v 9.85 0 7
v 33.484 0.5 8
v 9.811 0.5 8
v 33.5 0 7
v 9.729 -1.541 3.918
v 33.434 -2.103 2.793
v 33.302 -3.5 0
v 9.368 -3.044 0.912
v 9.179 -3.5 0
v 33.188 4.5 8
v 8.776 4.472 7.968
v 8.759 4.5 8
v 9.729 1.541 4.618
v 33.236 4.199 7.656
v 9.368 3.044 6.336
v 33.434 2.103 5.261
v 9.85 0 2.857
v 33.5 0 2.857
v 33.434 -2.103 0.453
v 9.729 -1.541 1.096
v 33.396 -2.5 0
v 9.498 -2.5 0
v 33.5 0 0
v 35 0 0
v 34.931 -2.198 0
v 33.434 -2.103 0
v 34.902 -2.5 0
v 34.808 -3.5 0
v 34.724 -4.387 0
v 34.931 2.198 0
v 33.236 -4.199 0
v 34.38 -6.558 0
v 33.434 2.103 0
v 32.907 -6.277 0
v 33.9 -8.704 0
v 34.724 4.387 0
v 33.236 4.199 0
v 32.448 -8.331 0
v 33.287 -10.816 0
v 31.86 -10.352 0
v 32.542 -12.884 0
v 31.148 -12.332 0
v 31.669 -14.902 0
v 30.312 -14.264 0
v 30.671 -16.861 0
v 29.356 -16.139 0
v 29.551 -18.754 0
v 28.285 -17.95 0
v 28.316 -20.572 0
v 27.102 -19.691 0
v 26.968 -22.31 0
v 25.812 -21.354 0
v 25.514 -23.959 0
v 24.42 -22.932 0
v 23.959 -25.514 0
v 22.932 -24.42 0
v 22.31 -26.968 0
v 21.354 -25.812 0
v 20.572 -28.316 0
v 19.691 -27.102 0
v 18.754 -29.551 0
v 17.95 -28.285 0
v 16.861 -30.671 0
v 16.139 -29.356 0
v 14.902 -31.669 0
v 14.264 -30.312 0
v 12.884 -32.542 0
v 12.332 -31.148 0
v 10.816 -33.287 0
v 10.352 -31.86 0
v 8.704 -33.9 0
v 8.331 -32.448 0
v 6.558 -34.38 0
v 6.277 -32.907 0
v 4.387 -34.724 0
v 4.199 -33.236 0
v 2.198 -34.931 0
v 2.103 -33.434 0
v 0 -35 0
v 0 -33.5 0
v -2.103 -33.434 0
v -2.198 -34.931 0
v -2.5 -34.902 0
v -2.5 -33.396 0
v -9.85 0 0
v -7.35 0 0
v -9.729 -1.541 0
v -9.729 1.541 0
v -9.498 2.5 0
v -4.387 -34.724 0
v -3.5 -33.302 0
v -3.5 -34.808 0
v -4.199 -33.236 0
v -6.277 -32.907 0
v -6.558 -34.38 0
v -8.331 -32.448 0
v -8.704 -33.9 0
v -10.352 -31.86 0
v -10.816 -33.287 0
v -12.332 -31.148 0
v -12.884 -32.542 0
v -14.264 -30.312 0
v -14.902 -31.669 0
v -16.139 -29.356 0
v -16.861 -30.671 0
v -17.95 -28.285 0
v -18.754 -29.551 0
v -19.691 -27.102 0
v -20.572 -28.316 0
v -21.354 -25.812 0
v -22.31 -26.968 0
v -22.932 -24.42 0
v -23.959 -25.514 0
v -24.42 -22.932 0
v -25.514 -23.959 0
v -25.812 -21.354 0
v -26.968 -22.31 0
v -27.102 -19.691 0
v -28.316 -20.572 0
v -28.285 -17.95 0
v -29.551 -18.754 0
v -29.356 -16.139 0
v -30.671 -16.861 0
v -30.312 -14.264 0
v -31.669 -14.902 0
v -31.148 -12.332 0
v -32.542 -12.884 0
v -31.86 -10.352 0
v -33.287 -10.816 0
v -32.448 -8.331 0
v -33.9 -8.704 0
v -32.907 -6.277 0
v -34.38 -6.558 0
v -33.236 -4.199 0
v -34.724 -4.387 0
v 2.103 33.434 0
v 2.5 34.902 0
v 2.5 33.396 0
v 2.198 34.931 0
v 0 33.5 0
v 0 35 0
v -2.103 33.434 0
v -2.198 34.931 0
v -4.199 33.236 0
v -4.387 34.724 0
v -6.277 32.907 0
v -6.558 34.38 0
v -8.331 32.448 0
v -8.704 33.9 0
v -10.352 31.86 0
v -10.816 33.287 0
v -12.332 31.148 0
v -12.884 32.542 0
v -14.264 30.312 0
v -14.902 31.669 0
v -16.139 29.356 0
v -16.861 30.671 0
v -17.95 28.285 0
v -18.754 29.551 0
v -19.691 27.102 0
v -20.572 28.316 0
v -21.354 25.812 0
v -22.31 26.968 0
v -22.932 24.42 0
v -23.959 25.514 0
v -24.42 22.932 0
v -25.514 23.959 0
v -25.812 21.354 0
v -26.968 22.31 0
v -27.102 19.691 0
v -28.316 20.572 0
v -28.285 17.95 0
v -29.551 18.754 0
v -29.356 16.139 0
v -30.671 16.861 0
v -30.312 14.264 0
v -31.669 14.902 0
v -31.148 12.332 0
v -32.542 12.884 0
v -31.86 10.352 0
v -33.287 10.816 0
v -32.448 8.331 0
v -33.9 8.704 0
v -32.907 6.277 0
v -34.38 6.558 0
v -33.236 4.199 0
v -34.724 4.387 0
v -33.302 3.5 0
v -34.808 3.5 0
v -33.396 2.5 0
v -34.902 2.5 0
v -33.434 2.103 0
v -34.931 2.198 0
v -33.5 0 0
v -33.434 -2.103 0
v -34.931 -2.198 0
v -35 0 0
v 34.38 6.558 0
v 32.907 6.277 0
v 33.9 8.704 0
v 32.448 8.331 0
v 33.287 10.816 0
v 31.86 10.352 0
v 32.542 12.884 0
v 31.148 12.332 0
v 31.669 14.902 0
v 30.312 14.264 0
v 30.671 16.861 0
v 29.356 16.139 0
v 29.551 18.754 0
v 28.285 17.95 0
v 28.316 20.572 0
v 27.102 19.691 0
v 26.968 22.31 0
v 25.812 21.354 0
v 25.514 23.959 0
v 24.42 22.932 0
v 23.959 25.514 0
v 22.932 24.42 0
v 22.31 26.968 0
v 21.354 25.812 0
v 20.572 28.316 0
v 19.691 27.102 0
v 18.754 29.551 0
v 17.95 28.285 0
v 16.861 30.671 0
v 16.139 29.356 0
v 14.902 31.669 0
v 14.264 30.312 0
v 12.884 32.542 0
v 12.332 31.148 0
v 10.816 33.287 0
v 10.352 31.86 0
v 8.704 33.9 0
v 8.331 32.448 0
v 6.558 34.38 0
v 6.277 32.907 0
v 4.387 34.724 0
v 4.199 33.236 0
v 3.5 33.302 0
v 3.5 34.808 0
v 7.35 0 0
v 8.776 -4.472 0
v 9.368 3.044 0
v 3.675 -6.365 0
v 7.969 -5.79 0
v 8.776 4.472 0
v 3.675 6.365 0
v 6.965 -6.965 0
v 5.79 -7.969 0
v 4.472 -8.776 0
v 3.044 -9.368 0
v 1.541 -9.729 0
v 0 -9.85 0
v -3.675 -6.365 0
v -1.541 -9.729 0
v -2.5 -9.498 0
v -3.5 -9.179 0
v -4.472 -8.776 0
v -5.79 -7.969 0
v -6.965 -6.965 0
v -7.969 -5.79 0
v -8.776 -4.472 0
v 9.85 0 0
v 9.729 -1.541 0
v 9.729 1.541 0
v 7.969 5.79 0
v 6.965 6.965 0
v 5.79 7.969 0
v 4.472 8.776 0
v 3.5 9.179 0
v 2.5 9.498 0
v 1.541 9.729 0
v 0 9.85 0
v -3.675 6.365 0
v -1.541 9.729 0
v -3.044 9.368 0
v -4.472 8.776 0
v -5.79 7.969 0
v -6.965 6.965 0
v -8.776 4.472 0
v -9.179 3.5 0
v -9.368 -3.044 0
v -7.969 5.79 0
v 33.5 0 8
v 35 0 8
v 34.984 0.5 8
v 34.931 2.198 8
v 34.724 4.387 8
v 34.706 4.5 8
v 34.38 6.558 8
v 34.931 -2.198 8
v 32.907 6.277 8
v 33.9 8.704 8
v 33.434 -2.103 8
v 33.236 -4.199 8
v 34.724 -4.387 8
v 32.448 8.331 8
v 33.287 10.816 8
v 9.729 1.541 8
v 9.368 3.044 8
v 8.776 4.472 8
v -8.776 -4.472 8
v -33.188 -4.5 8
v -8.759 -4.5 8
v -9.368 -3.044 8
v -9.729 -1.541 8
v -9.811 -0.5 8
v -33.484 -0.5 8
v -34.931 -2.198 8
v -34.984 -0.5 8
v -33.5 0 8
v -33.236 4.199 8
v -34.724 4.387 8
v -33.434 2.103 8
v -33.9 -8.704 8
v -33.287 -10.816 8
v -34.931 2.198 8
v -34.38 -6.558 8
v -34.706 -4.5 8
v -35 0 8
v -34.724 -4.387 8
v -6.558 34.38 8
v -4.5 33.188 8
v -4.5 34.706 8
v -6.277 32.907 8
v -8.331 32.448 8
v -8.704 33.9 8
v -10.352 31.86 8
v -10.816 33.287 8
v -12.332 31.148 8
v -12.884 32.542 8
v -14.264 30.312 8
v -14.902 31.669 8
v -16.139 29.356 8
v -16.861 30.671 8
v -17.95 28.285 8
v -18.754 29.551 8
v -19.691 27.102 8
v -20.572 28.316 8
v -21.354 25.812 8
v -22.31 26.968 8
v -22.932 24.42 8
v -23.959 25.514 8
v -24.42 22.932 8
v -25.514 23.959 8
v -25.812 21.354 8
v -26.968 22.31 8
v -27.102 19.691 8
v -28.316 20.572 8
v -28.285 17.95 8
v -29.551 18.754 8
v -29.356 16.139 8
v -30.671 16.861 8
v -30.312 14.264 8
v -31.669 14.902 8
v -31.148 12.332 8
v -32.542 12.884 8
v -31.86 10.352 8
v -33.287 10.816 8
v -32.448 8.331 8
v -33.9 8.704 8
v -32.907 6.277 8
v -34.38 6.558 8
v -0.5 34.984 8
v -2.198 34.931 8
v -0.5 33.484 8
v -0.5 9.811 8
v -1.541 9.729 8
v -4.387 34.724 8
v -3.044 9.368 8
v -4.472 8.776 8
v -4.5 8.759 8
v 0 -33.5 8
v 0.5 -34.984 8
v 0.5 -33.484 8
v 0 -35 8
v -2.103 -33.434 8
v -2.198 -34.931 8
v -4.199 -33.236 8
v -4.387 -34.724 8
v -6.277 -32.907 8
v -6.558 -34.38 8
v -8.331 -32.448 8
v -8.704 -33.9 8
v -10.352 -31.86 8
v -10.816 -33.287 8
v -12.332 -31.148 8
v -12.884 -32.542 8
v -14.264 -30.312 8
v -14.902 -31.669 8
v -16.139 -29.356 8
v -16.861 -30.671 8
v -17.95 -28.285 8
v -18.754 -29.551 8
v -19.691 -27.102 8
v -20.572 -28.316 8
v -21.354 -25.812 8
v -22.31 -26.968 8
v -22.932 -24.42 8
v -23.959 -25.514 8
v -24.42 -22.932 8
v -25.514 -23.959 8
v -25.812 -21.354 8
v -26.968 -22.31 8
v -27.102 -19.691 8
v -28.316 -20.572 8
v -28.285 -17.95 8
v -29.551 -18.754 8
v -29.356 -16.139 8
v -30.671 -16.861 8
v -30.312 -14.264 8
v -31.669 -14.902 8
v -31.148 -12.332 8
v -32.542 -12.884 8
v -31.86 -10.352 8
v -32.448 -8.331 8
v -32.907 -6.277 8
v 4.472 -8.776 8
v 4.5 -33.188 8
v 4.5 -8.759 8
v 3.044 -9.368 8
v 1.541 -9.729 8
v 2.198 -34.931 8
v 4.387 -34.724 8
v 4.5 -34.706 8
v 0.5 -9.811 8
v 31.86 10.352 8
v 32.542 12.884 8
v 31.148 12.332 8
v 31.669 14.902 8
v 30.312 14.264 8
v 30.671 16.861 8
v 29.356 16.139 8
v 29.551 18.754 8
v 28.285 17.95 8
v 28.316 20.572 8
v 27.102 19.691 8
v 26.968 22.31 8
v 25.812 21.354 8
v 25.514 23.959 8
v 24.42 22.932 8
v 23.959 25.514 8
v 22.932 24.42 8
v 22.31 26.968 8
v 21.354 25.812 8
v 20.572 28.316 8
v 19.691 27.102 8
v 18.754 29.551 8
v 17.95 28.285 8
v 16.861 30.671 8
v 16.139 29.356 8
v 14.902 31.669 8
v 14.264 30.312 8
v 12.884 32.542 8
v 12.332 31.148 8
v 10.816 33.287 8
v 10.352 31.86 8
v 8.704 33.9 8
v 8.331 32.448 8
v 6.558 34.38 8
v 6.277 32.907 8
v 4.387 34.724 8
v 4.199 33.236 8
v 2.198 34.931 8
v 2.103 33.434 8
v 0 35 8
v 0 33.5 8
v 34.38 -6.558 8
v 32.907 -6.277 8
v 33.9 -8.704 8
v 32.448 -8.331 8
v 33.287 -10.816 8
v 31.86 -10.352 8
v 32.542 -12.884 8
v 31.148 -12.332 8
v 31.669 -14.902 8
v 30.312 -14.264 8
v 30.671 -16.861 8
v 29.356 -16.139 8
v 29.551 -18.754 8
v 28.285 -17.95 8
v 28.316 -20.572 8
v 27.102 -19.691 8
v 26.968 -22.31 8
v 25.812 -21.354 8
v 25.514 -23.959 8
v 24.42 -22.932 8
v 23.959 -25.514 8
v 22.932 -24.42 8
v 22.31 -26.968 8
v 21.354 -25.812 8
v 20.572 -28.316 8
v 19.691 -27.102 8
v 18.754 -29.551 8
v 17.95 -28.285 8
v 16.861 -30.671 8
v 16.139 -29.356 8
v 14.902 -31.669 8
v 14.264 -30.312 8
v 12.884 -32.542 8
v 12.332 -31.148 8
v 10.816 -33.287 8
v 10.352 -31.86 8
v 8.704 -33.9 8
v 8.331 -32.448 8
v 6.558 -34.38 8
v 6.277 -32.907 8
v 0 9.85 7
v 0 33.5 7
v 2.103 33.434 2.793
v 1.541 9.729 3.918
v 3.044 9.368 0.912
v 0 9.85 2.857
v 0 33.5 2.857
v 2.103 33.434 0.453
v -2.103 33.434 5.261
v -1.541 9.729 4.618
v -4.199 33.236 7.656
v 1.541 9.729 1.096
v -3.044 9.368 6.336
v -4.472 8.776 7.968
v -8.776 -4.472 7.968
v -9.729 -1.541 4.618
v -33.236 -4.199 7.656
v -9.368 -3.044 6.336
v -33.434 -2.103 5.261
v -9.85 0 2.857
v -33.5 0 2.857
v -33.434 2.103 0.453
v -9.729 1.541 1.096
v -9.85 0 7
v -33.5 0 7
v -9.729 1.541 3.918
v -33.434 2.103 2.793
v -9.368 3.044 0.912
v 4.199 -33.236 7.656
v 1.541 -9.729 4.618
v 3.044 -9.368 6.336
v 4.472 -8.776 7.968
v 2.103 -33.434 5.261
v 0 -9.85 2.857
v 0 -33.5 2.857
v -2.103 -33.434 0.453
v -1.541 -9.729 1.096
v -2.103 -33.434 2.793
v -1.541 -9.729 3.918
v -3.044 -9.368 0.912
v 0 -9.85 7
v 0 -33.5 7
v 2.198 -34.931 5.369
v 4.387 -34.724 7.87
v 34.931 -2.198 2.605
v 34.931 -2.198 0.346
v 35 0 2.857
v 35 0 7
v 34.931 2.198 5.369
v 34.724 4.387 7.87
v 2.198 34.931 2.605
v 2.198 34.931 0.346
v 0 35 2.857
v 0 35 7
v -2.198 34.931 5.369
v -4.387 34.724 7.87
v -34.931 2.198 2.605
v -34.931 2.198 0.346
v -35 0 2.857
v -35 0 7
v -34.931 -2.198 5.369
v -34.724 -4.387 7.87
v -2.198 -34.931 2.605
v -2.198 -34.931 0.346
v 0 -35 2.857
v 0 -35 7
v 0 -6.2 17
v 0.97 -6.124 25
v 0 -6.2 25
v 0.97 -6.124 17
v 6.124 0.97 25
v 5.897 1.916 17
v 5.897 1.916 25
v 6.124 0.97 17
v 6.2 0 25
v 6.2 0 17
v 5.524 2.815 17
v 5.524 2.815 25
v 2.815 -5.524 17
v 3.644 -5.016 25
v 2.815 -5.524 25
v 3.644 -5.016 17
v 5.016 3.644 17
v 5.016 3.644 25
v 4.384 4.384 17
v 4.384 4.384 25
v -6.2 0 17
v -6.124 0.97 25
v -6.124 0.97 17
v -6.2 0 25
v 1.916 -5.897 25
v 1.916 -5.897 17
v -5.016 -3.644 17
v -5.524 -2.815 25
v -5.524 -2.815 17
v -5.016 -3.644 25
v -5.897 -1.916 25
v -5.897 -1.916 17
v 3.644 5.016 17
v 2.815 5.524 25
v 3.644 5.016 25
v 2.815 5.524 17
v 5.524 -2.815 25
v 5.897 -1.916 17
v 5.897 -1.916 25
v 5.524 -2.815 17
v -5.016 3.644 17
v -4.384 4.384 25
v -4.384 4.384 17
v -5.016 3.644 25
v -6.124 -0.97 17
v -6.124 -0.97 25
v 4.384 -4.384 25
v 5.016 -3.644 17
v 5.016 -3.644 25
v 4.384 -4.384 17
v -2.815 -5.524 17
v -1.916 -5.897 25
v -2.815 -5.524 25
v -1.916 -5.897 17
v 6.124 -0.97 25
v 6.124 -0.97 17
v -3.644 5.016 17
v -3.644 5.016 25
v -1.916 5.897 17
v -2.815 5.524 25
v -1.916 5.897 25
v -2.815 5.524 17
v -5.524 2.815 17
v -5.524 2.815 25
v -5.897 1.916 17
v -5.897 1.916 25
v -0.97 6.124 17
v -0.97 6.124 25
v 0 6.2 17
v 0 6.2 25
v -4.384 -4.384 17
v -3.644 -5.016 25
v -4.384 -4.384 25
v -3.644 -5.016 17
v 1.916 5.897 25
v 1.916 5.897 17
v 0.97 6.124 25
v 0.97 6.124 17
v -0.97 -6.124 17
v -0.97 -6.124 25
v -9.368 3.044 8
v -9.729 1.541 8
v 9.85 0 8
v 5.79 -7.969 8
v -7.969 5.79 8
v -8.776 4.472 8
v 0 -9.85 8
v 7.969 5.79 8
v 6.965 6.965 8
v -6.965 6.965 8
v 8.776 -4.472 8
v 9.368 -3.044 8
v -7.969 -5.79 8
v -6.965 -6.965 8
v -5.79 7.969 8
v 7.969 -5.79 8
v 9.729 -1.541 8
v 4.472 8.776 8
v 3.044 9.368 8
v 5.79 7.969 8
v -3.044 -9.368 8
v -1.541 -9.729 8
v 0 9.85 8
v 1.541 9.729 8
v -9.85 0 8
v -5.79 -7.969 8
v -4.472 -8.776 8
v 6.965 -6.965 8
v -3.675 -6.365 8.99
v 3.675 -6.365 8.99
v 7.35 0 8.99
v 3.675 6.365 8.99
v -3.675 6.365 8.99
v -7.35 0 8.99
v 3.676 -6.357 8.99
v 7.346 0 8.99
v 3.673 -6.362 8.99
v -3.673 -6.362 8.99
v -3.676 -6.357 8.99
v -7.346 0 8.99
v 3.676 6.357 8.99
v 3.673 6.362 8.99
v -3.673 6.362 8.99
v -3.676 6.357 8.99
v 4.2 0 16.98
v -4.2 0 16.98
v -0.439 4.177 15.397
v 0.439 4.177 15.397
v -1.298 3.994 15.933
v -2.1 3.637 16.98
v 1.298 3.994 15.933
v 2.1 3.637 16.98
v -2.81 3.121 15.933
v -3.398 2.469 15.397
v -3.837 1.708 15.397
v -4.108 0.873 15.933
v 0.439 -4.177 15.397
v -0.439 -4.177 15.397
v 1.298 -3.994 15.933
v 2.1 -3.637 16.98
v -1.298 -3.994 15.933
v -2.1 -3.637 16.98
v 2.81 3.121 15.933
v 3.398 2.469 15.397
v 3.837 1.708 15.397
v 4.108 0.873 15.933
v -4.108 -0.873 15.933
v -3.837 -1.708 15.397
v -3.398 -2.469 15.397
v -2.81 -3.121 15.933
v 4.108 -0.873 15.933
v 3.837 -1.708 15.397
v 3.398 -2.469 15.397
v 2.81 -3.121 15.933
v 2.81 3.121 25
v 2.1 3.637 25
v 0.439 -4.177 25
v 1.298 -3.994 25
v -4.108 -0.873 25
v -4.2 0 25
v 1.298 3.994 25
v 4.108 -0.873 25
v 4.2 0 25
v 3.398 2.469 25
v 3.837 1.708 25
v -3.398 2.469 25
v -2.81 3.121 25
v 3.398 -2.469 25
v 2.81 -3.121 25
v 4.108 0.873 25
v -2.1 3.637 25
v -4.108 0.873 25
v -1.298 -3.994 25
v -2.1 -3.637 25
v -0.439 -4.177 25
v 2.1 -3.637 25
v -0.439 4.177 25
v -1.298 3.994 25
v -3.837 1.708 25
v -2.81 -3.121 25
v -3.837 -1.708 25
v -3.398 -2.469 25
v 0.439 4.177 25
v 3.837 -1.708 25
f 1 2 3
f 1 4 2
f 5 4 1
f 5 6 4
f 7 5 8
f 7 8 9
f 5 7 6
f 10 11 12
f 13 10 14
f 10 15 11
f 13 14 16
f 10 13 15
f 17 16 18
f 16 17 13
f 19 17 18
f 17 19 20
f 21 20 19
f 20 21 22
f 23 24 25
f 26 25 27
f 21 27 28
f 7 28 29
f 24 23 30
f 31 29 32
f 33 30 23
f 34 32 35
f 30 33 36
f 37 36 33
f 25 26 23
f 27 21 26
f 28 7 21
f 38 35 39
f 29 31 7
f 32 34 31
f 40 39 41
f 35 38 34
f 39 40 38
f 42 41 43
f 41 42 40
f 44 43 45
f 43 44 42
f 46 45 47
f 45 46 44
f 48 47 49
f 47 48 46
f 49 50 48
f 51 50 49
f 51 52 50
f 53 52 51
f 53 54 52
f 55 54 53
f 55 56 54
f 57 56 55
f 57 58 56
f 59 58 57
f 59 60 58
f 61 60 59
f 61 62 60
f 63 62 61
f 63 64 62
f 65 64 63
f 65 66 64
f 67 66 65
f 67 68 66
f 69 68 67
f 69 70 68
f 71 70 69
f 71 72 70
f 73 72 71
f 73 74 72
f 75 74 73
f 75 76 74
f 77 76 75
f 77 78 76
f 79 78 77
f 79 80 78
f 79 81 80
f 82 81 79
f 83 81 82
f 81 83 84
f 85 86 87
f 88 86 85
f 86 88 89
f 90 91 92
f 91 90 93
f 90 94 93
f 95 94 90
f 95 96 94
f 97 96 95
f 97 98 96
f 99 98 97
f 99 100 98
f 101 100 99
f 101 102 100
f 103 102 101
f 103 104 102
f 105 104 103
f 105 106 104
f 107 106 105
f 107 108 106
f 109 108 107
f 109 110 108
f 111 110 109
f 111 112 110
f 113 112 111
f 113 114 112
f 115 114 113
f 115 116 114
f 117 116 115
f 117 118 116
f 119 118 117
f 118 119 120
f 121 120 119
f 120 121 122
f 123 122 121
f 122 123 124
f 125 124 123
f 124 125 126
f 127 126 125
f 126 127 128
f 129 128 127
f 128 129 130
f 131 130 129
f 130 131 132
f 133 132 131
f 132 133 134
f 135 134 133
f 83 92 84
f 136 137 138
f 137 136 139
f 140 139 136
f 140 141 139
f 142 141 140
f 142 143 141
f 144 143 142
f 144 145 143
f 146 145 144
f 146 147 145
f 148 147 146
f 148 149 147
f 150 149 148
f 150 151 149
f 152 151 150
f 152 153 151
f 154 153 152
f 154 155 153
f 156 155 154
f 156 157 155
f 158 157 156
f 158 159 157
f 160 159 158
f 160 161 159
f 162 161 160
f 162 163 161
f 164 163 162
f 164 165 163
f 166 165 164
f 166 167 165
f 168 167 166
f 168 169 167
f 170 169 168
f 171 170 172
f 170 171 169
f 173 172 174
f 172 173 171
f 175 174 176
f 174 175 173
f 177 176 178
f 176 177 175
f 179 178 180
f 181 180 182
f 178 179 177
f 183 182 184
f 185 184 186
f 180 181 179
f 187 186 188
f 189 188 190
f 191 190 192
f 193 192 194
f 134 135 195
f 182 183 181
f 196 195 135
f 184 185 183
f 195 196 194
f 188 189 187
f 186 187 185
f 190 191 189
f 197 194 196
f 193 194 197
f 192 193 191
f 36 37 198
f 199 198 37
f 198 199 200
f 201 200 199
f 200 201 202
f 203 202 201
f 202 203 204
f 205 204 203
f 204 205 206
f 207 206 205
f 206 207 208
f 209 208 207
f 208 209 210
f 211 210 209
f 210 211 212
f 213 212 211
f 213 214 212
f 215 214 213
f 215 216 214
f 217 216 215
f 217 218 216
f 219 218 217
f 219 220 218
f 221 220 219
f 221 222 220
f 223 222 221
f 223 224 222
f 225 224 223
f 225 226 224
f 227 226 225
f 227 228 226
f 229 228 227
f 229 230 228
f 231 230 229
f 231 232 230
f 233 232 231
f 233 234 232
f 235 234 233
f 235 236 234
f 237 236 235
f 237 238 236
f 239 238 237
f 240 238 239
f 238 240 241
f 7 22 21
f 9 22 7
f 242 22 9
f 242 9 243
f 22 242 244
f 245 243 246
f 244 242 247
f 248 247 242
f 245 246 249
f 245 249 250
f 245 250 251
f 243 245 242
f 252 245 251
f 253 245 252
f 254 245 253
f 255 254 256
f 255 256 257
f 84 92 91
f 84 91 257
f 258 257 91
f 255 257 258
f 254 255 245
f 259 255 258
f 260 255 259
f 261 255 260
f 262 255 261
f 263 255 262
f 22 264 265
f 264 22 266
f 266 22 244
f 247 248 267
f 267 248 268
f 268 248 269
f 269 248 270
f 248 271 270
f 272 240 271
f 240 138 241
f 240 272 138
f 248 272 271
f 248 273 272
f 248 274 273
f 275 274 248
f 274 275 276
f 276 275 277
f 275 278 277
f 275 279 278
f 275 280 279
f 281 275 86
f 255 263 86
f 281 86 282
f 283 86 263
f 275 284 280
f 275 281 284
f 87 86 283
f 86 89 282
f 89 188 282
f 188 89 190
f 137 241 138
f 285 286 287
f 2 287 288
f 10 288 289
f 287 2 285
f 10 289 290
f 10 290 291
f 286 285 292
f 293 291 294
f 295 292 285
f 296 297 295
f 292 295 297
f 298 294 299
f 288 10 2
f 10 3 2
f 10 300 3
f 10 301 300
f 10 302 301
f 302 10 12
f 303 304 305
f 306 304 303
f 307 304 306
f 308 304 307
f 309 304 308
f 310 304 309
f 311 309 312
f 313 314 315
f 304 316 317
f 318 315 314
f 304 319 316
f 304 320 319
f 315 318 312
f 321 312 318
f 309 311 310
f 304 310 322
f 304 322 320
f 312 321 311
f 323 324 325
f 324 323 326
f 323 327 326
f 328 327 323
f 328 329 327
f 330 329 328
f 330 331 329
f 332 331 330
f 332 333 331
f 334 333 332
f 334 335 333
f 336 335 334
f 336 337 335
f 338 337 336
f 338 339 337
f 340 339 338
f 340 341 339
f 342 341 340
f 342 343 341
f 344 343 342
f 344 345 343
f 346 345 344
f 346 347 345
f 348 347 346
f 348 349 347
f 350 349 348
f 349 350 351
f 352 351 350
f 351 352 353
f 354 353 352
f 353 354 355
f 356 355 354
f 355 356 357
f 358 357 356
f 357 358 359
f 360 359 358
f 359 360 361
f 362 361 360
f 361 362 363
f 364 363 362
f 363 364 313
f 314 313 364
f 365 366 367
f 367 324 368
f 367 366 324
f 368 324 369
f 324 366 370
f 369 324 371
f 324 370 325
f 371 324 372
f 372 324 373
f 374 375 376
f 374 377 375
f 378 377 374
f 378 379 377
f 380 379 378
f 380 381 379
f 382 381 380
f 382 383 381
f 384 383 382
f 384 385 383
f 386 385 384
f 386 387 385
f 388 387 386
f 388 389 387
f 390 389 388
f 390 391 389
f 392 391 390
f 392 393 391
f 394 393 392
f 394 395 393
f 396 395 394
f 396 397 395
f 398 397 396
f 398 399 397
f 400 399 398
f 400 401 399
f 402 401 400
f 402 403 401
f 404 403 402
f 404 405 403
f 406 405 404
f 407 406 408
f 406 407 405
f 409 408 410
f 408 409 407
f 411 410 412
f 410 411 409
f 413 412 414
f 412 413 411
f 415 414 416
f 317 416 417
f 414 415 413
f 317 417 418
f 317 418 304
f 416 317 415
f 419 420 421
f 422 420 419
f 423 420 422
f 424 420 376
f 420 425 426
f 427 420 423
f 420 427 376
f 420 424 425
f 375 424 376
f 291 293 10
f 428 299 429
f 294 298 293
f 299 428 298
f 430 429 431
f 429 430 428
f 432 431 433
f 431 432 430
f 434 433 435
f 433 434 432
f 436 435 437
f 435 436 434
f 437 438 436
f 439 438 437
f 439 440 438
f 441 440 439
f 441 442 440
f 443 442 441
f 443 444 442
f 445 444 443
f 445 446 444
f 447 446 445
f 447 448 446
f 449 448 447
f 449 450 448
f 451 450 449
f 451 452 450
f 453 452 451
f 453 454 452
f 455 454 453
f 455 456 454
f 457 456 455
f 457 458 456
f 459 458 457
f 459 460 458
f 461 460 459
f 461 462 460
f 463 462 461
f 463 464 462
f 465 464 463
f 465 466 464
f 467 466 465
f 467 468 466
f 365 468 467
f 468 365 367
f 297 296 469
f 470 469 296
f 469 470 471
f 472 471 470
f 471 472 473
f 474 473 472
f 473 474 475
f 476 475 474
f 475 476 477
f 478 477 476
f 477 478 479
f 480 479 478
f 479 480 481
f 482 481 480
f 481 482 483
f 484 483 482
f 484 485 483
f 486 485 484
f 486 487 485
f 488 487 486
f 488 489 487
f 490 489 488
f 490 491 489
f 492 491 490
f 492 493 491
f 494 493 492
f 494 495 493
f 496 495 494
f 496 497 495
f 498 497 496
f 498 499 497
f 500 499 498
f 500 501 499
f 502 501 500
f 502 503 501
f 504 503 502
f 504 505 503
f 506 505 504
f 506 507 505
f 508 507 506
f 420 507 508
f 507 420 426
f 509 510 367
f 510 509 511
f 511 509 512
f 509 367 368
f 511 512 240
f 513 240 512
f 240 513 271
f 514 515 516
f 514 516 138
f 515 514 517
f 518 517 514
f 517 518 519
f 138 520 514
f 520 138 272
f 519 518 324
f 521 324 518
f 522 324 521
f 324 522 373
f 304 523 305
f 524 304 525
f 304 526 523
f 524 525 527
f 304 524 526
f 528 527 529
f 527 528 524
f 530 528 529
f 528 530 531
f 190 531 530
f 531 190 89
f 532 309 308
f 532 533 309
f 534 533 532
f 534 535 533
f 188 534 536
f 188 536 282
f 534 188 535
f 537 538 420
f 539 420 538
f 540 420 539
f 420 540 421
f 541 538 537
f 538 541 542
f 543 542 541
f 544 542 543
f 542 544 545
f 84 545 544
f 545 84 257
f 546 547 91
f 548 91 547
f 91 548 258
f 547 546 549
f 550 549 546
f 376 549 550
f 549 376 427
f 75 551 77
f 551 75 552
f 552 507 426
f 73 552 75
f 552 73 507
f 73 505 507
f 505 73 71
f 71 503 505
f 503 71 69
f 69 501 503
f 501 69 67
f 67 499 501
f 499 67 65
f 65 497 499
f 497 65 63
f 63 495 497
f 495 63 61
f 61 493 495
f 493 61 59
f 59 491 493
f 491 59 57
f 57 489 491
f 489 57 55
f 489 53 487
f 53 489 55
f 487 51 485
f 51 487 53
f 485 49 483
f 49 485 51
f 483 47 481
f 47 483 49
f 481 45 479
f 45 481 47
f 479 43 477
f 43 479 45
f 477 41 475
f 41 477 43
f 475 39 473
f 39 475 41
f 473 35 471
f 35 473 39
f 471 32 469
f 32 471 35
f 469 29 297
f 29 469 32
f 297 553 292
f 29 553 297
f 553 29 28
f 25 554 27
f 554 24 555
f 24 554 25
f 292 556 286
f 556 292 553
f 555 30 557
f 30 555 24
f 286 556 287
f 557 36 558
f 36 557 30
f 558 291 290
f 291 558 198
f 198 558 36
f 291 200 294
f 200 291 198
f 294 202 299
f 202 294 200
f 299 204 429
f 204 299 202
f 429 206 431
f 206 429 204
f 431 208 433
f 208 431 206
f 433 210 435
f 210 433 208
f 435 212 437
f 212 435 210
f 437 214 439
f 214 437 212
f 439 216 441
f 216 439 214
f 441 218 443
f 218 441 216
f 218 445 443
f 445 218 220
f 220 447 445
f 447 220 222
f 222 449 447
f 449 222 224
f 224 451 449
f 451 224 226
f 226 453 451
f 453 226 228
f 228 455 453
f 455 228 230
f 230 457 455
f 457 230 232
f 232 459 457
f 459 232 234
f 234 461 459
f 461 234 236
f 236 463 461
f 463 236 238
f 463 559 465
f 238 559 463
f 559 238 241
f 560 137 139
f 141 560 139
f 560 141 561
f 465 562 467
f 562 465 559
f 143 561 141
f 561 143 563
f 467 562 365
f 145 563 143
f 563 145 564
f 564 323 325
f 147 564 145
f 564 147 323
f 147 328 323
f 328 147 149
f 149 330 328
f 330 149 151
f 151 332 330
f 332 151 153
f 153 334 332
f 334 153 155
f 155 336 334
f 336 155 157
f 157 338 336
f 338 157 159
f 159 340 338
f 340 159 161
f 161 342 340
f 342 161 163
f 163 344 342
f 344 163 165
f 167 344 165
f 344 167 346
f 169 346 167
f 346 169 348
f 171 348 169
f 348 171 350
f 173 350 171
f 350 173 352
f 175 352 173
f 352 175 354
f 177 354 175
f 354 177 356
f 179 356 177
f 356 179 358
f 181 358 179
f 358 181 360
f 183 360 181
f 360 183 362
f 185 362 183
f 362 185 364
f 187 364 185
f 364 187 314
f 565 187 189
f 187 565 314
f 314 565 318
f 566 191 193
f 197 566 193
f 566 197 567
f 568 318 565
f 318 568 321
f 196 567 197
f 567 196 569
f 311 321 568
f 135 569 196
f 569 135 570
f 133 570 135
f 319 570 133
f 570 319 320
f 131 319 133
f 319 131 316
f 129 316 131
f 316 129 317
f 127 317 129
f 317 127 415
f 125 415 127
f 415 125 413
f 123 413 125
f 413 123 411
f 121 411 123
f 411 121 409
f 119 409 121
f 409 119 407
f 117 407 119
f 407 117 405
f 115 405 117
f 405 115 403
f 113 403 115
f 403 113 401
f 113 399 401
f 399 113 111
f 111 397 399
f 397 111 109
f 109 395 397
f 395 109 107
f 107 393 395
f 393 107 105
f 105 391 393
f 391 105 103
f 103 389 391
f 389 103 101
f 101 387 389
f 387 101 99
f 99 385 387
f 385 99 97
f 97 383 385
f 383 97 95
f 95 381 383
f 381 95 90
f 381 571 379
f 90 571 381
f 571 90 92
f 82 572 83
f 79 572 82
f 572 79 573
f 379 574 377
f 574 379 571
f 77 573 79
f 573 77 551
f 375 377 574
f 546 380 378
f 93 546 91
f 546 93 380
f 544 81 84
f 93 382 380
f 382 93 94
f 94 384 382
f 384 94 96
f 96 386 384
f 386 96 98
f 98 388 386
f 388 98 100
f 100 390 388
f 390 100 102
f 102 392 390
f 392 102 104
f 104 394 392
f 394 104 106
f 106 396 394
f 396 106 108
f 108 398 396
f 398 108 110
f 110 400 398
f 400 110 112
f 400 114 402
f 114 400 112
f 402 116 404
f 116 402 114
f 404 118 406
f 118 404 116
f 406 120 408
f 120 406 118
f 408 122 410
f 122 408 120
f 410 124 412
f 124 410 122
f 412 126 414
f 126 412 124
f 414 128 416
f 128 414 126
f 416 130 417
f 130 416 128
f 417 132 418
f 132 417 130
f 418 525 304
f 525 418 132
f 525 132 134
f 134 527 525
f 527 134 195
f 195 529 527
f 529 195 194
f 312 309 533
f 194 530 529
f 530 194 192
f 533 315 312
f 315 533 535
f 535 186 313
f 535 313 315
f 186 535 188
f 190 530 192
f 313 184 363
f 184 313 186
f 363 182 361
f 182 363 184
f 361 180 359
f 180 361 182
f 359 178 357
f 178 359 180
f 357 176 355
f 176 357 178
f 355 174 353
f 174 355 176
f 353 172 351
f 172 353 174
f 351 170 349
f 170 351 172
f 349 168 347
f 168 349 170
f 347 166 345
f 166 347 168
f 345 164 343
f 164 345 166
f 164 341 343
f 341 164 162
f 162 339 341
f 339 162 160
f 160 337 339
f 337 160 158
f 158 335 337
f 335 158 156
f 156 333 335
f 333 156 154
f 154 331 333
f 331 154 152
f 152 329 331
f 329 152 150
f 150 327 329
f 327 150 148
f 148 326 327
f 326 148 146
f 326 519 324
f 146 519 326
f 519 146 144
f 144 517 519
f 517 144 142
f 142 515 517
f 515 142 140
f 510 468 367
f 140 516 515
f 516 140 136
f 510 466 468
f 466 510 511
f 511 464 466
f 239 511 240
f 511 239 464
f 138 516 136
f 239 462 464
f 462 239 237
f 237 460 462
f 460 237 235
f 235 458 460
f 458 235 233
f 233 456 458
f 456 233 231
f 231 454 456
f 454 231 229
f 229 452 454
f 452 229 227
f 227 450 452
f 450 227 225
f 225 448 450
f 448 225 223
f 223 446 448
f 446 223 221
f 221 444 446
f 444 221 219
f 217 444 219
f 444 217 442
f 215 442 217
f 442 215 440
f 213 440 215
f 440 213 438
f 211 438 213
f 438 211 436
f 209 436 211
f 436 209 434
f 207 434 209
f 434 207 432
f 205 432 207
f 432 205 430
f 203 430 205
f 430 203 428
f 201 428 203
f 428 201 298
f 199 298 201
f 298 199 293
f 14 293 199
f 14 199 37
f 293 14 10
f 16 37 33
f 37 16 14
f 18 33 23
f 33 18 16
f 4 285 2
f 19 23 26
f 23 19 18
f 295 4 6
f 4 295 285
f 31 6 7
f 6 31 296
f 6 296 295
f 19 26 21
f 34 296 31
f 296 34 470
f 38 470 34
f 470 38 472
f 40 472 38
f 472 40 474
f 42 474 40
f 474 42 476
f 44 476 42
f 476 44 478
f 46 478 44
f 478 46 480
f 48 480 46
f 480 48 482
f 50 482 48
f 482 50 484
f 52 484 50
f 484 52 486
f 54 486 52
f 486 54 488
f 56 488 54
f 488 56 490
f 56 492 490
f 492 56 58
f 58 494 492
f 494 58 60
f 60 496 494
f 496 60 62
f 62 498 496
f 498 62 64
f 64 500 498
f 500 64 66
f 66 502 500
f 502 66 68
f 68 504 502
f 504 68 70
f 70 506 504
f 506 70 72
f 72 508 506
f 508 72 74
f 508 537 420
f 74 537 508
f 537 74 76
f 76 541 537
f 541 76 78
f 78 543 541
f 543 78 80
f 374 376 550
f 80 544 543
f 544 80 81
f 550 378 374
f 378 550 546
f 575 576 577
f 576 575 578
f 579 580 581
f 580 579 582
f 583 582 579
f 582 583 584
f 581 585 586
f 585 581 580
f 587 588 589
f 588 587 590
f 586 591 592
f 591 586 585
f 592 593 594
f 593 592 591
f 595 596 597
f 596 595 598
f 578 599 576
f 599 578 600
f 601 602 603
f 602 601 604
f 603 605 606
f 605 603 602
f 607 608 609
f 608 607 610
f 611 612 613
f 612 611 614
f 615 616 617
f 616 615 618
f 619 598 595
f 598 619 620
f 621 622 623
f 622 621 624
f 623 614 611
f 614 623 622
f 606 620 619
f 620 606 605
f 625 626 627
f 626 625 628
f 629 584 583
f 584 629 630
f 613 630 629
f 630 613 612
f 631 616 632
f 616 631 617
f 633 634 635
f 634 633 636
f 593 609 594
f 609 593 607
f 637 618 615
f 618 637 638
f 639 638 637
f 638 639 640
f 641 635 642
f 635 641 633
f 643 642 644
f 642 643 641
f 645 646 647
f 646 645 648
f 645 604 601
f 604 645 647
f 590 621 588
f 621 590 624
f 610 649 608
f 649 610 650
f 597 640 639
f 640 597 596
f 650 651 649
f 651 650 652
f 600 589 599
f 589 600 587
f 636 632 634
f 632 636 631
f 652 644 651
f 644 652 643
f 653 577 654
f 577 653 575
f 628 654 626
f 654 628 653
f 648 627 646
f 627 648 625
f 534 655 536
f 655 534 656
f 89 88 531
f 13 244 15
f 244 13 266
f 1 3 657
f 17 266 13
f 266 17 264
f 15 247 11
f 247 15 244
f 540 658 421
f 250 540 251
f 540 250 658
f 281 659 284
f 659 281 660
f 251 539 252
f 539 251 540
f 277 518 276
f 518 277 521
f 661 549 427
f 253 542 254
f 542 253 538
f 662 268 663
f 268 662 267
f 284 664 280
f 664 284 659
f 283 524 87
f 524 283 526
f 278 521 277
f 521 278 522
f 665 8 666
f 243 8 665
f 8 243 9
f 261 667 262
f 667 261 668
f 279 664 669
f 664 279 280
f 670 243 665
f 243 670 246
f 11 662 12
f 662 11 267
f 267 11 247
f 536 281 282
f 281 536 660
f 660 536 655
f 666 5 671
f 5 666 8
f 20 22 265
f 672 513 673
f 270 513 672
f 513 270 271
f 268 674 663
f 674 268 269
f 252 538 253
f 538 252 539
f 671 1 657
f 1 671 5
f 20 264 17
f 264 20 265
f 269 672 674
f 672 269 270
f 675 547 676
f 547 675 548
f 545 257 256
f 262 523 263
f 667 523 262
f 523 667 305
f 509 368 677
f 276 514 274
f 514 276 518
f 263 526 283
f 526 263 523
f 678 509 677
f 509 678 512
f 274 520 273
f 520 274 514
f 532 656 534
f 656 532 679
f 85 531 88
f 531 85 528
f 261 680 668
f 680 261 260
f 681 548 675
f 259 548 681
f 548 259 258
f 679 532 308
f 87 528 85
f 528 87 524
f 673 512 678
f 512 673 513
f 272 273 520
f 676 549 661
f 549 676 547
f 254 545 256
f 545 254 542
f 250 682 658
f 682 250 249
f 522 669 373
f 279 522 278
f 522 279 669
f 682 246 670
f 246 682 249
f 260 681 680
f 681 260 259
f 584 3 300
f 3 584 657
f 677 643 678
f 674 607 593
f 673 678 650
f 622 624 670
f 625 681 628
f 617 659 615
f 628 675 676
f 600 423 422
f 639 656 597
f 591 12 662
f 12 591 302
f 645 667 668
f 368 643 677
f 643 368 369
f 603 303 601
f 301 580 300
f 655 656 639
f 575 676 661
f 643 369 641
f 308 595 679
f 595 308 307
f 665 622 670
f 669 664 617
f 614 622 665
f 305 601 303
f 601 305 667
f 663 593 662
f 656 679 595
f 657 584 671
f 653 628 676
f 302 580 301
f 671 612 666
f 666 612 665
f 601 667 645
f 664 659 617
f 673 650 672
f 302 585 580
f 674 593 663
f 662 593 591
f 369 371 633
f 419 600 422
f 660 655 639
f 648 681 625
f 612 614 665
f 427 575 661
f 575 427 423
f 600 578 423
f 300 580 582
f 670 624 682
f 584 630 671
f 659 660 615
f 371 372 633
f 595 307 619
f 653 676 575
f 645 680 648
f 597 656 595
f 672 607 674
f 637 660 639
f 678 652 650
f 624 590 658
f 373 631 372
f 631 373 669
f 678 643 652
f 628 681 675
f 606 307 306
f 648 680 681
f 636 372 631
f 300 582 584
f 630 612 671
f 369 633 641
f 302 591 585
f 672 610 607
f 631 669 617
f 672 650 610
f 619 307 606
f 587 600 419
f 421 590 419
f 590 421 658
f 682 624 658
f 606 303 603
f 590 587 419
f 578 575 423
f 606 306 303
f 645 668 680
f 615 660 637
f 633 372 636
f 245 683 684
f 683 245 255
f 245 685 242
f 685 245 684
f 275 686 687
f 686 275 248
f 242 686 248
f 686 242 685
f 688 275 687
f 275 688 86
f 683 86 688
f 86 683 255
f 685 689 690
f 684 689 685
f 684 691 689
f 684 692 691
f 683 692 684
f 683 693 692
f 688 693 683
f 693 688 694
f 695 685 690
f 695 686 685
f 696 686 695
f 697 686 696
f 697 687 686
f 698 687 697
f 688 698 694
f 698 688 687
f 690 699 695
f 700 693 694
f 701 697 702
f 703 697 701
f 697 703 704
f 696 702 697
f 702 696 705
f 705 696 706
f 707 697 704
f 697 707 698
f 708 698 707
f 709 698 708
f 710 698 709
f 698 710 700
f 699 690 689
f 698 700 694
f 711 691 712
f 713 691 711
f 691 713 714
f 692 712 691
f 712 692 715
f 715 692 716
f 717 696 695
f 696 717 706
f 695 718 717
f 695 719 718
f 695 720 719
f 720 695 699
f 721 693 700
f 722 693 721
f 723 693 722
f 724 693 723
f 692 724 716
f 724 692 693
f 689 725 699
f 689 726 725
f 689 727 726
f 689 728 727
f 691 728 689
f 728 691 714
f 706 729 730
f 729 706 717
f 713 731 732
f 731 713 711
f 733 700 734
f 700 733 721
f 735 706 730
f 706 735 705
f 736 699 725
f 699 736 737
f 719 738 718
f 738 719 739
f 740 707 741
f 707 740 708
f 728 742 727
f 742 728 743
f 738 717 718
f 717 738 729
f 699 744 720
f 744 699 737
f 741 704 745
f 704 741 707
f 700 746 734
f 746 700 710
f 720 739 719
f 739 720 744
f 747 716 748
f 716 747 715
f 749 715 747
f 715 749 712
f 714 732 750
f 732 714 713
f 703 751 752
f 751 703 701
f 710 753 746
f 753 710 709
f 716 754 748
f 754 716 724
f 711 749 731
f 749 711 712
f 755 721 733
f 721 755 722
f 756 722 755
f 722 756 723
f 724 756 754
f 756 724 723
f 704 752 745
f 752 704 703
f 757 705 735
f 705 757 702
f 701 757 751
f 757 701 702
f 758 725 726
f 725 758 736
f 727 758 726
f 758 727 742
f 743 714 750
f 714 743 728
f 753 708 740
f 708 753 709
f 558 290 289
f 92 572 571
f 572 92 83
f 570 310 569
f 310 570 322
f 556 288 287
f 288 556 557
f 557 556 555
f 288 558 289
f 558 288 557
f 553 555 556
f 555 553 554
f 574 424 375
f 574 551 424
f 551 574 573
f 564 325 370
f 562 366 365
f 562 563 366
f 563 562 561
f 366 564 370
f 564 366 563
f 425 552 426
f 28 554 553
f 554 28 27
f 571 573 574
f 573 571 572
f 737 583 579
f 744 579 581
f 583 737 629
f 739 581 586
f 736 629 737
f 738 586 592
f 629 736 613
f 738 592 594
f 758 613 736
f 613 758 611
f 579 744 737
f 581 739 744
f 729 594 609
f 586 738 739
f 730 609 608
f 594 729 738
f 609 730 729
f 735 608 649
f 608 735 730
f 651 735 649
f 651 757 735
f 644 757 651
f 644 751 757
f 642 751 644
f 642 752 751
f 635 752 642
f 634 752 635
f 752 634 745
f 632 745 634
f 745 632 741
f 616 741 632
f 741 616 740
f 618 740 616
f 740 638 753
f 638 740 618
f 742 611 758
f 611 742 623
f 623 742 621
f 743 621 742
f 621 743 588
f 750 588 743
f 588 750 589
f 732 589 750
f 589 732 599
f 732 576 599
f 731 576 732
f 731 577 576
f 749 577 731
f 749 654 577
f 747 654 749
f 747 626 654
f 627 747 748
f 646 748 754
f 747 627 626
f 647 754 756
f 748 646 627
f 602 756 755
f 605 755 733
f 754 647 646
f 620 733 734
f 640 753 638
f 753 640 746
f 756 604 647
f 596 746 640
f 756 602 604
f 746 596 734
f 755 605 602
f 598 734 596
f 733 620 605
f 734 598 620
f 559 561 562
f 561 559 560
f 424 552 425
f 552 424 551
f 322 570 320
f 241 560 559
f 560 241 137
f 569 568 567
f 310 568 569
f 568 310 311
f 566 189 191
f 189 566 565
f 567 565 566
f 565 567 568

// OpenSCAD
arms=4;
boltd=8.4; // [6.8:1/4",8.4:5/8"];
nutd=14.7; // [13.1:1/4",14.7:5/8"];
od=70;
th=25;
es=.35;
topnut=0;
intersection() {
  cylinder(d=od,h=th,$fn=100);
difference() {
  union() {
    linear_extrude(8,convexity=3) difference() {
      circle(d=od,$fn=100);
      circle(d=od-3,$fn=100);
    }
    cylinder(d=boltd+4,h=80,$fn=40);
    cylinder(d=nutd+5,h=8,$fn=40);
    translate([0,0,8]) cylinder(d1=nutd+5,d2=boltd+4,h=9,$fn=40);
    *translate([0,0,76]) difference() {
      cylinder(d=26,h=4,$fn=50);
      translate([0,0,-.01]) cylinder(d=18,h=4.02,$fn=50);
    }
    *translate([0,0,topnut?0:5]) {
    translate([0,0,th-10]) cylinder(d=boltd+24,h=10,$fn=40);
    translate([0,0,th-26]) cylinder(d1=boltd+4,d2=boltd+24,h=16,$fn=40);
    }
    for(r=[0:360/arms:359])
      rotate([0,0,r])
      {
        *rotate([0,0,60]) translate([0,-2,th-24]) cube([24,4,4]);
        translate([0,4])
          rotate([0,0,0]) {
            rotate([0,90]) mirror([1,0]) linear_extrude(od/2) mirror([0,0,0]) translate([0,-7.5]) polygon([[0,0],[8,4],[8,8],[0,1]]); //square([8,4]);
          }
        *translate([0,0,8])
        scale([1,1,1])
        linear_extrude(height=th-16,center=false,convexity=10,twist=-90,scale=[1,es],$fn=th*2) translate([od/2-6,.5]) square([8,4]);
      }
  }
  union(){
  translate([0,0,-.01]) cylinder(d=nutd,h=9,$fn=6);
  translate([0,0,8.98]) cylinder(d1=nutd,d2=boltd,h=8,$fn=6);
  translate([0,0,-.01]) cylinder(d=boltd,h=120,$fn=30);
    if(topnut)
    translate([0,0,th-8]) cylinder(d=nutd,h=8.02,$fn=6);
}
}
}
